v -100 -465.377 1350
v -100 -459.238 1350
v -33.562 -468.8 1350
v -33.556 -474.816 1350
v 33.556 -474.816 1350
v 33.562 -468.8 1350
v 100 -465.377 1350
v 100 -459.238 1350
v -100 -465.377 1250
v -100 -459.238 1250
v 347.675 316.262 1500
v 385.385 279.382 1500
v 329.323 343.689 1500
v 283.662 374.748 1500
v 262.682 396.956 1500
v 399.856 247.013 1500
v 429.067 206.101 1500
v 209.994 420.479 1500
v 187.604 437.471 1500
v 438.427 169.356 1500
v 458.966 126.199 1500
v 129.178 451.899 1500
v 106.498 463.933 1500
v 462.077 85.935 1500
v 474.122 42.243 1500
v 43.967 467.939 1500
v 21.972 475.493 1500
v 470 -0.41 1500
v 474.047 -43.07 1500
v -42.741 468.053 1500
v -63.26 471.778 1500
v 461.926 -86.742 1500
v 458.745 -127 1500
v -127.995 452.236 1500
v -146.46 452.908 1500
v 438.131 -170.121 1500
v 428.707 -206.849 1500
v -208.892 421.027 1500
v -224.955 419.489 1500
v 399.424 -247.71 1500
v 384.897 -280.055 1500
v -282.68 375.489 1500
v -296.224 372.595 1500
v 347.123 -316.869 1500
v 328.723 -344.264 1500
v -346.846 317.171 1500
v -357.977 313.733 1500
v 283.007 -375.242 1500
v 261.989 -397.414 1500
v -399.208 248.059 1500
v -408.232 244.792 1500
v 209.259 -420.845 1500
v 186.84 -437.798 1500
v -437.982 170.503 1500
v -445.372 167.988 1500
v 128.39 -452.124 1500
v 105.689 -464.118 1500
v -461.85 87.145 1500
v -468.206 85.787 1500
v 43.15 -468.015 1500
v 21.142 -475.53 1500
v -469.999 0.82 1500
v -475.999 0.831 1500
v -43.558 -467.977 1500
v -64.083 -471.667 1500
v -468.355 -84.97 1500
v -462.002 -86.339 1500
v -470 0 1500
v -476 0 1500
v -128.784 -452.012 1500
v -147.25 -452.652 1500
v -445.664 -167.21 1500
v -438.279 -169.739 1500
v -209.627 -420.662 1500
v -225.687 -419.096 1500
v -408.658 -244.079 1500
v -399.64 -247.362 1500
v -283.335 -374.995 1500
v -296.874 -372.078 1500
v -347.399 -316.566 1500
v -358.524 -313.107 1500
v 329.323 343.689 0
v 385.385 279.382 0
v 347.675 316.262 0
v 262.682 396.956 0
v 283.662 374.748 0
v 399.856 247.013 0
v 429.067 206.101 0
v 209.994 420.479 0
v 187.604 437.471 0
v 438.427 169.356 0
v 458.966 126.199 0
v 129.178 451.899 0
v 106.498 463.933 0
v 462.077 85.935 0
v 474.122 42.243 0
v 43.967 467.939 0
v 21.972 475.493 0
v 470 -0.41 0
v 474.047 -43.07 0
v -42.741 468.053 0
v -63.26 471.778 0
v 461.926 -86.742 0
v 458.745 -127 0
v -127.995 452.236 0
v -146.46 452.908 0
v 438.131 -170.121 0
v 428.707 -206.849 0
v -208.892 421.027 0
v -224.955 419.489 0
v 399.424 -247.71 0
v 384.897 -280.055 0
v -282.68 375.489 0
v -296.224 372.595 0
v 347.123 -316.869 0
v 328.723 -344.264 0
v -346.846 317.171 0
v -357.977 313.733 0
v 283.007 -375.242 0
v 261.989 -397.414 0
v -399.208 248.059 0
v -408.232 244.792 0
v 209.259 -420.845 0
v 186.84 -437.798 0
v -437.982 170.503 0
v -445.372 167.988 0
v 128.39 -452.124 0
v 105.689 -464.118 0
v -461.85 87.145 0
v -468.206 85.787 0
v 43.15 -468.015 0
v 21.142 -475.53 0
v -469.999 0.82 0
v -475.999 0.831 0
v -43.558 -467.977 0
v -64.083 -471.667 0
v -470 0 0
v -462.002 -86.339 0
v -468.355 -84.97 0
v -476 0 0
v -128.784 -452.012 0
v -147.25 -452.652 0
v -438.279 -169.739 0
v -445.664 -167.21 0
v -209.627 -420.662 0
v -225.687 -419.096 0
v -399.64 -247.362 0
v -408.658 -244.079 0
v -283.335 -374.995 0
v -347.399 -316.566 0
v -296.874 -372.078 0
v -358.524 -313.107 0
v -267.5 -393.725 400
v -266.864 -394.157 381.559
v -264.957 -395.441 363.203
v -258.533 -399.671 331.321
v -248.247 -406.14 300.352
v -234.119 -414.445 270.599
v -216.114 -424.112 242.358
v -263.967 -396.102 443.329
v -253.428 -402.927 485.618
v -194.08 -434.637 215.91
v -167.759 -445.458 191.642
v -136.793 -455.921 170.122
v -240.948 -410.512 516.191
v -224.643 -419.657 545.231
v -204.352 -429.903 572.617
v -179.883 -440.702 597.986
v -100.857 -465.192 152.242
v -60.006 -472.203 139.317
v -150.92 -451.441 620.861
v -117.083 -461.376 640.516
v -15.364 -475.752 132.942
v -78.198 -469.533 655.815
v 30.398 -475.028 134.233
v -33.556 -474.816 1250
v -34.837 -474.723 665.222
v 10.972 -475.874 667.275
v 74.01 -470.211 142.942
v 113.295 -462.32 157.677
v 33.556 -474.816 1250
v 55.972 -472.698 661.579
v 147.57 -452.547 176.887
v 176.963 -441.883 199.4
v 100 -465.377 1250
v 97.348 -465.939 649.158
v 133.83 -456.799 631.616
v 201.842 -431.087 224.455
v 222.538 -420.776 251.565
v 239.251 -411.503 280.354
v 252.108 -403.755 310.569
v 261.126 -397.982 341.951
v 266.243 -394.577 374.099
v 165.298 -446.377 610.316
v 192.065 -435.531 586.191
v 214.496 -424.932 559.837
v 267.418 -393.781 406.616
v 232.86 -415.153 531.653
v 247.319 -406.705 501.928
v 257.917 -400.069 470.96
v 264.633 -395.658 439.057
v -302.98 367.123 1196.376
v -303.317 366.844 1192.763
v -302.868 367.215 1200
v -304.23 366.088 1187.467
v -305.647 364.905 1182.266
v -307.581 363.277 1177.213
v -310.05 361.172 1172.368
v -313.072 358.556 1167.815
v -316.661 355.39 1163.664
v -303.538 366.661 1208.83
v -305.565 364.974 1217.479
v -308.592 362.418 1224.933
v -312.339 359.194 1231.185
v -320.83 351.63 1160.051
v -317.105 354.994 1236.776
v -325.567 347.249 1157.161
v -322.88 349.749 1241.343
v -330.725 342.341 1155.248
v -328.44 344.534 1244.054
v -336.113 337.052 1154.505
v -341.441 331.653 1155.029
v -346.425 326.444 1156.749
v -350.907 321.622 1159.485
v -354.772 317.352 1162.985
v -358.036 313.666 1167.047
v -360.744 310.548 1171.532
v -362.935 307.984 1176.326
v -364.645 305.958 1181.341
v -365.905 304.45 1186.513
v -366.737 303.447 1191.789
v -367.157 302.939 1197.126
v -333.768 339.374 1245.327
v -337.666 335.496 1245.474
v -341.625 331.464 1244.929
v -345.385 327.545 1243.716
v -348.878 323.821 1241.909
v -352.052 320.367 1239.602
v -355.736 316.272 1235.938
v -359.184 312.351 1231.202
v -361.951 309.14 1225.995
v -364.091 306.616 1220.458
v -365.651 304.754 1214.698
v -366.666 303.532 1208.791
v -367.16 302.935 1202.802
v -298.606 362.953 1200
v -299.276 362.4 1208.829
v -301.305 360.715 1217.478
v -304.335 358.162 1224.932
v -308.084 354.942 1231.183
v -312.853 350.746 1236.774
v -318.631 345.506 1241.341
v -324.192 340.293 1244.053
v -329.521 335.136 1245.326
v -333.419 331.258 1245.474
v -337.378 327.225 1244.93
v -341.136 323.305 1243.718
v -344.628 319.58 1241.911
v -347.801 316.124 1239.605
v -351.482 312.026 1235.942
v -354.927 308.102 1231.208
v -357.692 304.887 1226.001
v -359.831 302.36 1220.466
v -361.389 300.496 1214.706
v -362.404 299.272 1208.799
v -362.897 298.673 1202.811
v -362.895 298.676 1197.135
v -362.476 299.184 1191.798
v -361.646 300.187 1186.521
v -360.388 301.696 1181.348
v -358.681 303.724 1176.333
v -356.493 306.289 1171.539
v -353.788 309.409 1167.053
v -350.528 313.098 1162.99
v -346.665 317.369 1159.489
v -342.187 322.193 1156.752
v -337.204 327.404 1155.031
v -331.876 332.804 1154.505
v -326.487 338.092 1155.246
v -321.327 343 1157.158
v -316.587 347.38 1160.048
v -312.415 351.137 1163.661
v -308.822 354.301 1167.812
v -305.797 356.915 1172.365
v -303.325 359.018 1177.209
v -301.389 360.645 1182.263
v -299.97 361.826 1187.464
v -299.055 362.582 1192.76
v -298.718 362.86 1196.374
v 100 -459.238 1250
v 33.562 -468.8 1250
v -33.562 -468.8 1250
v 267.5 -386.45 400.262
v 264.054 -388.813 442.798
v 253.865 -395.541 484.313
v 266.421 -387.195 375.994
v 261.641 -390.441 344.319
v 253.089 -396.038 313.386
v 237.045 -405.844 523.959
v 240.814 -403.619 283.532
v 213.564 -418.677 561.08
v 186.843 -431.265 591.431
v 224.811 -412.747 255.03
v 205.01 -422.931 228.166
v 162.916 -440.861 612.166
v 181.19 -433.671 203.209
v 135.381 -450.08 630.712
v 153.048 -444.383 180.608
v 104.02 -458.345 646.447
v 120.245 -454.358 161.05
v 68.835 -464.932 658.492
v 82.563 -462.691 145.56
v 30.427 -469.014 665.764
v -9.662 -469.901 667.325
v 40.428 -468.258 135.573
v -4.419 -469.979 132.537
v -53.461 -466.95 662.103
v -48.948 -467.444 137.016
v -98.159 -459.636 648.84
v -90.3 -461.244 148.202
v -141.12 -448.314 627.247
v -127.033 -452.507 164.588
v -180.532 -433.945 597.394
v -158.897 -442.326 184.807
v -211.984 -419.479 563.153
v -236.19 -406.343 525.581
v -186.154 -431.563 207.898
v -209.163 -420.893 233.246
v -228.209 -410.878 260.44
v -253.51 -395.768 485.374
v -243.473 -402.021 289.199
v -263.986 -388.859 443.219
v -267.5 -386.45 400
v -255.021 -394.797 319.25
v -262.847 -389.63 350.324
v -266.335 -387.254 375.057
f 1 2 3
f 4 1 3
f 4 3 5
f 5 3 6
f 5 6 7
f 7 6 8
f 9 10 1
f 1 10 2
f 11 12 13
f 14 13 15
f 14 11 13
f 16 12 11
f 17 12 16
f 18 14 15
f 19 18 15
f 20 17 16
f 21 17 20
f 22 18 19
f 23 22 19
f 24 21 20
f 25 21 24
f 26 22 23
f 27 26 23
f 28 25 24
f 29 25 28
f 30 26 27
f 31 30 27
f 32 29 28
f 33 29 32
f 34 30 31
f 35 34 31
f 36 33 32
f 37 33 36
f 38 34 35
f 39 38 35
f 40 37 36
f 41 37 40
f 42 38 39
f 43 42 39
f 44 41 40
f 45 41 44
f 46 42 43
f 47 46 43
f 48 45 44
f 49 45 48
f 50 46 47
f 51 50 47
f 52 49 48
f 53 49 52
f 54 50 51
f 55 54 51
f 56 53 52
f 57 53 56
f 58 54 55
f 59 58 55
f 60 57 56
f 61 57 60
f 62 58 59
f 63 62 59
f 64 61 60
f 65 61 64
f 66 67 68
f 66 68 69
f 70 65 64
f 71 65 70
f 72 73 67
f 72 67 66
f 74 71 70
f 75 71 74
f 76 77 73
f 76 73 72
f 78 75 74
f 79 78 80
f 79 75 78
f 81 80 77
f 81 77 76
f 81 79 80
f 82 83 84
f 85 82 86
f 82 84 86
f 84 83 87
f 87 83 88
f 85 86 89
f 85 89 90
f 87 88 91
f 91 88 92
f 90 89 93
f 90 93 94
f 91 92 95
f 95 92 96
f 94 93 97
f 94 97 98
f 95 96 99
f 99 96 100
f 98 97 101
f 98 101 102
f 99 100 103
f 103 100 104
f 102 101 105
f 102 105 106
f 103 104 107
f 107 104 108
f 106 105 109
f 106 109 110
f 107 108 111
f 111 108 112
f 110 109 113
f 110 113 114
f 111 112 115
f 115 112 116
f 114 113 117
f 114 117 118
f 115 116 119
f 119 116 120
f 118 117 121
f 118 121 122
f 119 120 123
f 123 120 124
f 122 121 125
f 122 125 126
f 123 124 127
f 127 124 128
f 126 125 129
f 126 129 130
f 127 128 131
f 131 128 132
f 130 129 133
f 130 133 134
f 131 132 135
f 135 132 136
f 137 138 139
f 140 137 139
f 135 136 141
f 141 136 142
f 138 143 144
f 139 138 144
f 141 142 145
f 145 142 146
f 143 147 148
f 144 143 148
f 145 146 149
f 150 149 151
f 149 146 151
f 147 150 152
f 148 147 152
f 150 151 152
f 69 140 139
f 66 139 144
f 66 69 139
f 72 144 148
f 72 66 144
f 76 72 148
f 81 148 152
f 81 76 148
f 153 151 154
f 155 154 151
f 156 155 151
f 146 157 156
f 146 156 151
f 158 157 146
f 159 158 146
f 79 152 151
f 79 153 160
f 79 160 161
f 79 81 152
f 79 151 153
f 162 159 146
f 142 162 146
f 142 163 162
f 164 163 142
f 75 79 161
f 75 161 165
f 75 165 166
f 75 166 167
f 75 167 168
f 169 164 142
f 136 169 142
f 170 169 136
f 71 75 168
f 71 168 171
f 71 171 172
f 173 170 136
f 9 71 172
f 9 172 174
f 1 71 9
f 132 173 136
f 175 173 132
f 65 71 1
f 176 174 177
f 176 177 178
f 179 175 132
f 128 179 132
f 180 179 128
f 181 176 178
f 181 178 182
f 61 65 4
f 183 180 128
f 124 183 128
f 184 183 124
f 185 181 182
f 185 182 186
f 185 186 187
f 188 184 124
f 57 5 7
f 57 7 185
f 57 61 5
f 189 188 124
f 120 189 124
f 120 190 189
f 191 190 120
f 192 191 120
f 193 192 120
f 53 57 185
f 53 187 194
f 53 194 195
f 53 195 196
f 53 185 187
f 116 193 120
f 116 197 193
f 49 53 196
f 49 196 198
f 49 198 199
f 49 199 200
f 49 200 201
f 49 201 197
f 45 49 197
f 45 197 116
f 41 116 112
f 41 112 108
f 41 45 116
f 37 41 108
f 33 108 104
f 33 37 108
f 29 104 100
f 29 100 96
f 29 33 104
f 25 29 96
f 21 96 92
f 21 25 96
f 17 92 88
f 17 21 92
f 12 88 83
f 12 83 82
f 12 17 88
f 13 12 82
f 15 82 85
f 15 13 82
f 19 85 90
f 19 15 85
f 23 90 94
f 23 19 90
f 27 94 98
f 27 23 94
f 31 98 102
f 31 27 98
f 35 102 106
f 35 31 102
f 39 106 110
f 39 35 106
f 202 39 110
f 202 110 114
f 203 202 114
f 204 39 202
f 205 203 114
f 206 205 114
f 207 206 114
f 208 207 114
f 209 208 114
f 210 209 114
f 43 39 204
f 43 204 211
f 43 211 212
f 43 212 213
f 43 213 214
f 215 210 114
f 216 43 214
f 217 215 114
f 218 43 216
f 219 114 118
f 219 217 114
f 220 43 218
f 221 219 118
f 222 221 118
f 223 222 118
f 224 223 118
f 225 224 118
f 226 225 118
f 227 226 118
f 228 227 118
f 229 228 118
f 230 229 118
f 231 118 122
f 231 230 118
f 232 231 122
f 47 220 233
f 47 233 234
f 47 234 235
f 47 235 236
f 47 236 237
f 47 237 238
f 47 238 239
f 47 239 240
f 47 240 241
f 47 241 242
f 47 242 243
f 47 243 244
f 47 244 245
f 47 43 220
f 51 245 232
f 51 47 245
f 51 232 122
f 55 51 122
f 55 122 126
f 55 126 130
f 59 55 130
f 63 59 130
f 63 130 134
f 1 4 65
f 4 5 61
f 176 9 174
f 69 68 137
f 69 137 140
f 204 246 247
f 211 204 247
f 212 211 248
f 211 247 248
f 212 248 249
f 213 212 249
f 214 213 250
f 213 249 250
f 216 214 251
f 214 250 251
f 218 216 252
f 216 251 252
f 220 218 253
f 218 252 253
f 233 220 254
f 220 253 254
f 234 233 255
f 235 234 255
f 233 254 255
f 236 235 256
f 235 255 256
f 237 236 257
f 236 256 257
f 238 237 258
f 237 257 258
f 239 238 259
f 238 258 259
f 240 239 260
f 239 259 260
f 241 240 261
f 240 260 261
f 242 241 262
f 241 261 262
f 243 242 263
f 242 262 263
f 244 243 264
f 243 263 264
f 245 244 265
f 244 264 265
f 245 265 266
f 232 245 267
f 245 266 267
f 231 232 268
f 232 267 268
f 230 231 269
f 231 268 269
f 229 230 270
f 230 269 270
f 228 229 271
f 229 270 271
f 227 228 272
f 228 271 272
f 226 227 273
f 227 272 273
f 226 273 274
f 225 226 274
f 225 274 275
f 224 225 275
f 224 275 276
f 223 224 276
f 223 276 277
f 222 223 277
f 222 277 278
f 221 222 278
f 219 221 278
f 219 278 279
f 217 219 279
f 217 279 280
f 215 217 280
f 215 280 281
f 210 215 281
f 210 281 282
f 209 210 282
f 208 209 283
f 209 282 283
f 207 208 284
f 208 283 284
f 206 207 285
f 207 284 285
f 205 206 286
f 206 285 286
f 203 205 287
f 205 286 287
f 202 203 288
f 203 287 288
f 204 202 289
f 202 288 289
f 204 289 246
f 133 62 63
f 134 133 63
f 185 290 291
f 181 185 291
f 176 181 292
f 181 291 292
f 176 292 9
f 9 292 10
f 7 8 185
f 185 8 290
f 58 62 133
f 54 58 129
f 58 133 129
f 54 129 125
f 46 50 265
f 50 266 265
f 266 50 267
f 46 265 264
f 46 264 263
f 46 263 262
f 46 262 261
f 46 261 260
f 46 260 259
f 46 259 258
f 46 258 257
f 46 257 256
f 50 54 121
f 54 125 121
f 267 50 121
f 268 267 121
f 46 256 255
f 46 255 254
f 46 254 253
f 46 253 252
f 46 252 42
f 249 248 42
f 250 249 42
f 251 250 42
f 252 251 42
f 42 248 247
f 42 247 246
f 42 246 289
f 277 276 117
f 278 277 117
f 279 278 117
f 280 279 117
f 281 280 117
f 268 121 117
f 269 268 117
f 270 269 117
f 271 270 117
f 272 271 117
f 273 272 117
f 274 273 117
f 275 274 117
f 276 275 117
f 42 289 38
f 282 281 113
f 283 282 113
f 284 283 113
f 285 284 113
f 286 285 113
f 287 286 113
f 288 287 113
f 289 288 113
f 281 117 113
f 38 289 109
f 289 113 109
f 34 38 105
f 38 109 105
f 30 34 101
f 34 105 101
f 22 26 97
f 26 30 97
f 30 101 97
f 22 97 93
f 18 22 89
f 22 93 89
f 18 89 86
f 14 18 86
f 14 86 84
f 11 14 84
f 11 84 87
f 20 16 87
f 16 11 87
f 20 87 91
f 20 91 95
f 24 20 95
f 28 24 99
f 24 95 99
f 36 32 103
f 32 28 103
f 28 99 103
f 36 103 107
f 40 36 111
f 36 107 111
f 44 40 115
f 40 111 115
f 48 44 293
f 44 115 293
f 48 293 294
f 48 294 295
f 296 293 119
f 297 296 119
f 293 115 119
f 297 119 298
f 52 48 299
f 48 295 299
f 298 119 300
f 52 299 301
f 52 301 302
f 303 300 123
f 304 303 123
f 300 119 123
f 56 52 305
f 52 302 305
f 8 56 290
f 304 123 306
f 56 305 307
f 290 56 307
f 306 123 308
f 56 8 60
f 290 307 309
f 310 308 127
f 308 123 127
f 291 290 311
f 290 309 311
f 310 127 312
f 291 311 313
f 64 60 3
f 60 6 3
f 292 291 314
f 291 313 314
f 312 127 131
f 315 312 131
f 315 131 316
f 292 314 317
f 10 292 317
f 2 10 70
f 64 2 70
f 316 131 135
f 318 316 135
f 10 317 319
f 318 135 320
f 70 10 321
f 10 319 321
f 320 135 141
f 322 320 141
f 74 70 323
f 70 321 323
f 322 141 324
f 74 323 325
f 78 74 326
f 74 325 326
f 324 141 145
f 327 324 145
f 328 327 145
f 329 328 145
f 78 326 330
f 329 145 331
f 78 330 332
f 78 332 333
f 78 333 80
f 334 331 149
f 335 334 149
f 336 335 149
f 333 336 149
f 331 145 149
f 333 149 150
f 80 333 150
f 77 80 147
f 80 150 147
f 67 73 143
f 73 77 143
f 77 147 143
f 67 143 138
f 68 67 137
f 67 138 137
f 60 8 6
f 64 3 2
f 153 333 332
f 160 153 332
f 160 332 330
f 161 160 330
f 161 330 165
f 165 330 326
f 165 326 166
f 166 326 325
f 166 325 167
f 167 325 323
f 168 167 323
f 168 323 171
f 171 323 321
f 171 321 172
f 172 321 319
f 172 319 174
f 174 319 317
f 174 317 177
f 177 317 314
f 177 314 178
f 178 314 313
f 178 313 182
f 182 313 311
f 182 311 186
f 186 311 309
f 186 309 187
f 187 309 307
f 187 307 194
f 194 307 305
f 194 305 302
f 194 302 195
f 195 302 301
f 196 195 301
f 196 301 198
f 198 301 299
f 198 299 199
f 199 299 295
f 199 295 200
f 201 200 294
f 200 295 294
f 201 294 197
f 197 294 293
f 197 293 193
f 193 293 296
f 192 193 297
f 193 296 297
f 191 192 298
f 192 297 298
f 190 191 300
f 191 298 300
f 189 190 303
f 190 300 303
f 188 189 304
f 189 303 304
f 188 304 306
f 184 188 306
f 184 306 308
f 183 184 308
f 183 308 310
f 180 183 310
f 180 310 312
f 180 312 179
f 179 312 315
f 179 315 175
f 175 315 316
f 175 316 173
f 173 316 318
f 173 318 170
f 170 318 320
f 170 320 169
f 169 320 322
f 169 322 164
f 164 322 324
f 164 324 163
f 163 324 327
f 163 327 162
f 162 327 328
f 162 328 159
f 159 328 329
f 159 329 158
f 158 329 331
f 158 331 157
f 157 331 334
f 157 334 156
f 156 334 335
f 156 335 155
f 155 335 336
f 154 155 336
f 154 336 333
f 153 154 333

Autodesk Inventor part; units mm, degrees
sketch "Sketch1" plane through (0, 0, 0) normal (0, 1, 0) x (-1, 0, 0)
  line L0 (476, 1500) -> (470, 1500)
  line L1 (470, 1500) -> (470, 0)
  line L2 (470, 0) -> (476, 0)
  line L3 (476, 0) -> (476, 1500)
  line L4 (0, 0) -> (0, 1673.0415)
  point P0 (473, 0)
  dimension "d0" = 6
  dimension "d1" = 1500
  dimension "d2" = 940
revolve "Revolution1" add sketch "Sketch1" angle 359.9 about axis through (0, 0, 0) along (0, 0, 1)
sketch "Sketch2" plane through (0, 0, 0) normal (0, 1, 0) x (-1, 0, 0)
  circle A0 centre (0, 400) radius 267.5
  line L0 (470, 1500) -> (-470, 1500) projected
  line L1 (110, 1300) -> (-110, 1300) construction
  line L2 (110, 1390) -> (-110, 1390)
  line L3 (-110, 1210) -> (110, 1210)
  arc A1 (110, 1210) -> (110, 1390) centre (110, 1300) ccw
  arc A2 (-110, 1390) -> (-110, 1210) centre (-110, 1300) ccw
  line L4 (200, 1300) -> (-200, 1300) construction
  point P0 (0, 0)
  point P1 (469.9993, 1500)
  point P2 (0, 1300)
  dimension "d4" = 535
  dimension "d12" = 400
  dimension "d15" = 200
  dimension "d16" = 400
  dimension "d17" = 180
extrude "Extrusion1" cut sketch "Sketch2" against normal through all contours A0
sketch "floor angle sketch" plane through (0, 0, 0) normal (0, 0, 1) x (1, 0, 0)
  line L0 (0, 0) -> (0, -267.717)
  line L1 (0, -267.717) -> (0, 0)
  line L2 (0, 0) -> (0, -172)
  line L3 (0, 0) -> (-63.6396, 63.6396)
  line L4 (0, 0) -> (23.2937, -86.9333)
  dimension "Feeder_way_angle" = 0
  dimension "Feeder_way_line" = 172
  dimension "Outer_way_line" = 90
  dimension "Inner_way_line" = 90
  dimension "Outer_way_angle" = 345
  dimension "Inner_way_angle" = 135
ref_plane "Feeder Plane" through (0, 0, -10) normal (1, 0, 0) x (0, 0, 1)
sketch "Feeder horisont hight angle" plane through (0, 0, -10) normal (1, 0, 0) x (0, 0, 1)
  line L0 (1510, -470) -> (1510, 470) construction
  line L1 (10, 0) -> (1510, 0) construction
  line L2 (1310, 0) -> (1310, 476)
  line L3 (10, 476) -> (1510, 476) construction
  line L4 (1310, 476) -> (1310, 0) construction
  point P0 (1510, 0)
  point P1 (1510, -0.8203)
  dimension "d34" = 1300
  dimension "d35" = 0
ref_plane "Feeder Work Plane" through (0, 0, 1300) normal (0, -1, 0) x (1, 0, 0)
sketch "Sketch8" plane through (0, 0, 1300) normal (0, -1, 0) x (1, 0, 0)
  circle A0 centre (0, 0) radius 86 construction
  line L0 (-100, 50) -> (100, 50)
  line L1 (100, 50) -> (100, -50)
  line L2 (100, -50) -> (-100, -50)
  line L3 (-100, -50) -> (-100, 50)
  line L4 (-100, 50) -> (100, -50) construction
  line L5 (100, 50) -> (-100, -50) construction
  arc A1 (-100, -50) -> (100, -50) centre (0, 409.2385) ccw construction
  arc A2 (-100, 50) -> (100, 50) centre (0, 509.2385) ccw construction
  point P0 (0, -1300)
  point P1 (0, 0)
  dimension "d36" = 172
  dimension "d50" = 200
  dimension "d51" = 100
  dimension "d52" = 470
extrude "Feeder Extrusion" cut sketch "Sketch8" along normal through all
ref_plane "Inner Plane" through (0, 0, 0) normal (0.7071, 0.7071, 0) x (-0.7071, 0.7071, 0)
sketch "Inner horisont hight angle" plane through (0, 0, 0) normal (0.7071, 0.7071, 0) x (-0.7071, 0.7071, 0)
  line L0 (476, 1500) -> (-476, 1500) construction
  line L1 (476, 0) -> (476, 1500) construction
  line L2 (0, 0) -> (0, 1500) construction
  line L3 (0, 1200) -> (476, 1200) construction
  line L4 (476, 1200) -> (0, 1200)
  point P0 (336.5828, 1500)
  point P1 (337.1698, 1500)
  dimension "d40" = 0
  dimension "d41" = 1200
ref_plane "Inner Work Plane" through (0, 0, 1200) normal (0.7071, -0.7071, 0) x (0.7071, 0.7071, 0)
sketch "Sketch10" plane through (0, 0, 1200) normal (0.7071, -0.7071, 0) x (0.7071, 0.7071, 0)
  circle A0 centre (0, 0) radius 45.5
  point P0 (0, -1200)
  point P1 (0, 0)
  point P2 (0, 0)
  point P3 (0, 0)
  dimension "d42" = 91
extrude "Inner Extrusion" cut sketch "Sketch10" against normal through all
ref_plane "Outer Plane" through (0, 0, 0) normal (-0.9659, -0.2588, 0) x (0.2588, -0.9659, 0)
sketch "Sketch11" plane through (0, 0, 0) normal (-0.9659, -0.2588, 0) x (0.2588, -0.9659, 0)
  line L0 (0, 0) -> (0, 1500)
  line L1 (476, 1500) -> (-476, 1500) projected
  line L2 (0, 700) -> (476, 700)
  line L3 (476, 0) -> (476, 1500) projected
  line L4 (476, 700) -> (0, 700)
  point P0 (-123.1979, 1500)
  point P1 (-124.0001, 1500)
  dimension "d45" = 0
  dimension "d46" = 700
ref_plane "Work Plane9" through (0, 0, 700) normal (-0.2588, 0.9659, 0) x (-0.9659, -0.2588, 0)
sketch "Sketch12" plane through (0, 0, 700) normal (-0.2588, 0.9659, 0) x (-0.9659, -0.2588, 0)
  circle A0 centre (0, 0) radius 46
  point P0 (0, -700)
  point P1 (0, 0)
  point P2 (0, 0)
  point P3 (0, 0)
  dimension "d47" = 92
extrude "Extrusion6" [suppressed]
equation "\"d2\" = MAIN_filter_diam"
equation "\"d4\" = Accsess_hatch_diameter"
equation "\"d16\" = Charging_hatch_width"
equation "\"d17\" = Charging_hatch_hight"
equation "\"d34\" = Feedr_hight"
equation "\"BendRadius\" = Thickness"
equation "\"BendReliefWidth\" = Thickness"
equation "\"BendReliefDepth\" = 0.5 * Thickness"
equation "\"CornerReliefSize\" = 4 * Thickness"
equation "\"MinimumRemnant\" = 2 * Thickness"
equation "\"TransitionRadius\" = BendRadius"
equation "\"JacobiRadiusSize\" = BendRadius"
equation "\"GapSize\" = Thickness"
equation "\"Feedr_hight\" = 1300"
equation "\"Feeder_horisont_hight_angle\" = 0"
equation "\"MAIN_filter_diam\" = 940"
equation "\"Accsess_hatch_diameter\" = 535"
equation "\"Charging_hatch_width\" = 400"
equation "\"Charging_hatch_hight\" = 180"
equation "\"Thickness\" = 6"
properties part number "SLM 701 main shell D1200" material "Steel"
